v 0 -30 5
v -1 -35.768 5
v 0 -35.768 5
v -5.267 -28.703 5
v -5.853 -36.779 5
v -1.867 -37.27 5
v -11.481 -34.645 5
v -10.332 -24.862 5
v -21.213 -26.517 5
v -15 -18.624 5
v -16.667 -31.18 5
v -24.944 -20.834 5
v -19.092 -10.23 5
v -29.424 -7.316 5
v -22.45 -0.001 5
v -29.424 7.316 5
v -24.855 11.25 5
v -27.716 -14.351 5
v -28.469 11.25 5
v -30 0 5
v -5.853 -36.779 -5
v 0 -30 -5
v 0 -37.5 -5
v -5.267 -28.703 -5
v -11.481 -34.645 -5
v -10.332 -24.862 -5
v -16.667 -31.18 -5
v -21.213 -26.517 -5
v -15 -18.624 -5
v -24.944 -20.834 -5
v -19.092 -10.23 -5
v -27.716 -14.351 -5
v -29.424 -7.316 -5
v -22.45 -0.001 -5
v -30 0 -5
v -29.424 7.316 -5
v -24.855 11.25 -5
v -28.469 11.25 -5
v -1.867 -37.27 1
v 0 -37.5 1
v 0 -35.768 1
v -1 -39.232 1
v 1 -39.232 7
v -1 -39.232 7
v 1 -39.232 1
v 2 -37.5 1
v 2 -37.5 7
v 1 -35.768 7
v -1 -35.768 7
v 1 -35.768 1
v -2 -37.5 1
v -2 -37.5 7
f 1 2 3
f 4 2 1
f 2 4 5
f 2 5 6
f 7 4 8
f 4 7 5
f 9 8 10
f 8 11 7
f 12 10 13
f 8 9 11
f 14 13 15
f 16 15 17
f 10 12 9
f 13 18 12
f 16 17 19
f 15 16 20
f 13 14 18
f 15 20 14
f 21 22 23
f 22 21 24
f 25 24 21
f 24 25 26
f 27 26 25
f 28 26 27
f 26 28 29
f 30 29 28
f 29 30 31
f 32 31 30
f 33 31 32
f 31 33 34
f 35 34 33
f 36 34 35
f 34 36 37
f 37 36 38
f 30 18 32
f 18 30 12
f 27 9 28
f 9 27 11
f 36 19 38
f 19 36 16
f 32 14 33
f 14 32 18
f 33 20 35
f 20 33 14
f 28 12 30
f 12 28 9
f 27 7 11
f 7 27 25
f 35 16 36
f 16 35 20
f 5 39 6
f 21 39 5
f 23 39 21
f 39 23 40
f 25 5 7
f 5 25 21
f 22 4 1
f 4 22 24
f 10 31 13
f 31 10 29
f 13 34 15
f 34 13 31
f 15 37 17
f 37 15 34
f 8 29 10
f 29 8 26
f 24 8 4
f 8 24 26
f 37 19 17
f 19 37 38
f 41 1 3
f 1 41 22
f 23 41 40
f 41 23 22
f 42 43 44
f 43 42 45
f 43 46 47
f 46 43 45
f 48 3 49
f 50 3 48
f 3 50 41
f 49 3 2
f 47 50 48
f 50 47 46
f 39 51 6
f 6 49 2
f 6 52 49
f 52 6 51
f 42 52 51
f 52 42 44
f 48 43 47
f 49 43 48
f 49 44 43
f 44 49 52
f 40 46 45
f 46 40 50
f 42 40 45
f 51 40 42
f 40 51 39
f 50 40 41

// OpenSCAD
h=10;
r=15;
ysc=2.5;
res = 32;
d=1;
//grabber
union() {
    difference() {
        scale([2,ysc,1]) {
            difference() {
                cyl(h=h,r=r,center=true);
                scale([.5,1,1]) {
                    translate([0, r, 0]) {
                        cyl(h=h*2,r=r*1.8,center=true);
                    }
                }
             
                translate([0,r * .8,0])
                    cube([r*4, r , r*10], true);   
            }
        }
        //remove half 
        translate([-r*15*(1 - d), -r*15, -r*15])
            cube([r*30,r*30,r*30],false);
    }
    //cylinder base
    translate([0, -r * ysc, h * .4 * d])
        cylinder($fn = 6, h=h * .6, r1 = 2, r2 = 2, center = true);
//        cyl(h=h * .6,r=2,center=true);
}

module cyl(h=10, r=15, center=true){
    cylinder($fn = res, h=h, r1 = r, r2 = r, center = true);
}
